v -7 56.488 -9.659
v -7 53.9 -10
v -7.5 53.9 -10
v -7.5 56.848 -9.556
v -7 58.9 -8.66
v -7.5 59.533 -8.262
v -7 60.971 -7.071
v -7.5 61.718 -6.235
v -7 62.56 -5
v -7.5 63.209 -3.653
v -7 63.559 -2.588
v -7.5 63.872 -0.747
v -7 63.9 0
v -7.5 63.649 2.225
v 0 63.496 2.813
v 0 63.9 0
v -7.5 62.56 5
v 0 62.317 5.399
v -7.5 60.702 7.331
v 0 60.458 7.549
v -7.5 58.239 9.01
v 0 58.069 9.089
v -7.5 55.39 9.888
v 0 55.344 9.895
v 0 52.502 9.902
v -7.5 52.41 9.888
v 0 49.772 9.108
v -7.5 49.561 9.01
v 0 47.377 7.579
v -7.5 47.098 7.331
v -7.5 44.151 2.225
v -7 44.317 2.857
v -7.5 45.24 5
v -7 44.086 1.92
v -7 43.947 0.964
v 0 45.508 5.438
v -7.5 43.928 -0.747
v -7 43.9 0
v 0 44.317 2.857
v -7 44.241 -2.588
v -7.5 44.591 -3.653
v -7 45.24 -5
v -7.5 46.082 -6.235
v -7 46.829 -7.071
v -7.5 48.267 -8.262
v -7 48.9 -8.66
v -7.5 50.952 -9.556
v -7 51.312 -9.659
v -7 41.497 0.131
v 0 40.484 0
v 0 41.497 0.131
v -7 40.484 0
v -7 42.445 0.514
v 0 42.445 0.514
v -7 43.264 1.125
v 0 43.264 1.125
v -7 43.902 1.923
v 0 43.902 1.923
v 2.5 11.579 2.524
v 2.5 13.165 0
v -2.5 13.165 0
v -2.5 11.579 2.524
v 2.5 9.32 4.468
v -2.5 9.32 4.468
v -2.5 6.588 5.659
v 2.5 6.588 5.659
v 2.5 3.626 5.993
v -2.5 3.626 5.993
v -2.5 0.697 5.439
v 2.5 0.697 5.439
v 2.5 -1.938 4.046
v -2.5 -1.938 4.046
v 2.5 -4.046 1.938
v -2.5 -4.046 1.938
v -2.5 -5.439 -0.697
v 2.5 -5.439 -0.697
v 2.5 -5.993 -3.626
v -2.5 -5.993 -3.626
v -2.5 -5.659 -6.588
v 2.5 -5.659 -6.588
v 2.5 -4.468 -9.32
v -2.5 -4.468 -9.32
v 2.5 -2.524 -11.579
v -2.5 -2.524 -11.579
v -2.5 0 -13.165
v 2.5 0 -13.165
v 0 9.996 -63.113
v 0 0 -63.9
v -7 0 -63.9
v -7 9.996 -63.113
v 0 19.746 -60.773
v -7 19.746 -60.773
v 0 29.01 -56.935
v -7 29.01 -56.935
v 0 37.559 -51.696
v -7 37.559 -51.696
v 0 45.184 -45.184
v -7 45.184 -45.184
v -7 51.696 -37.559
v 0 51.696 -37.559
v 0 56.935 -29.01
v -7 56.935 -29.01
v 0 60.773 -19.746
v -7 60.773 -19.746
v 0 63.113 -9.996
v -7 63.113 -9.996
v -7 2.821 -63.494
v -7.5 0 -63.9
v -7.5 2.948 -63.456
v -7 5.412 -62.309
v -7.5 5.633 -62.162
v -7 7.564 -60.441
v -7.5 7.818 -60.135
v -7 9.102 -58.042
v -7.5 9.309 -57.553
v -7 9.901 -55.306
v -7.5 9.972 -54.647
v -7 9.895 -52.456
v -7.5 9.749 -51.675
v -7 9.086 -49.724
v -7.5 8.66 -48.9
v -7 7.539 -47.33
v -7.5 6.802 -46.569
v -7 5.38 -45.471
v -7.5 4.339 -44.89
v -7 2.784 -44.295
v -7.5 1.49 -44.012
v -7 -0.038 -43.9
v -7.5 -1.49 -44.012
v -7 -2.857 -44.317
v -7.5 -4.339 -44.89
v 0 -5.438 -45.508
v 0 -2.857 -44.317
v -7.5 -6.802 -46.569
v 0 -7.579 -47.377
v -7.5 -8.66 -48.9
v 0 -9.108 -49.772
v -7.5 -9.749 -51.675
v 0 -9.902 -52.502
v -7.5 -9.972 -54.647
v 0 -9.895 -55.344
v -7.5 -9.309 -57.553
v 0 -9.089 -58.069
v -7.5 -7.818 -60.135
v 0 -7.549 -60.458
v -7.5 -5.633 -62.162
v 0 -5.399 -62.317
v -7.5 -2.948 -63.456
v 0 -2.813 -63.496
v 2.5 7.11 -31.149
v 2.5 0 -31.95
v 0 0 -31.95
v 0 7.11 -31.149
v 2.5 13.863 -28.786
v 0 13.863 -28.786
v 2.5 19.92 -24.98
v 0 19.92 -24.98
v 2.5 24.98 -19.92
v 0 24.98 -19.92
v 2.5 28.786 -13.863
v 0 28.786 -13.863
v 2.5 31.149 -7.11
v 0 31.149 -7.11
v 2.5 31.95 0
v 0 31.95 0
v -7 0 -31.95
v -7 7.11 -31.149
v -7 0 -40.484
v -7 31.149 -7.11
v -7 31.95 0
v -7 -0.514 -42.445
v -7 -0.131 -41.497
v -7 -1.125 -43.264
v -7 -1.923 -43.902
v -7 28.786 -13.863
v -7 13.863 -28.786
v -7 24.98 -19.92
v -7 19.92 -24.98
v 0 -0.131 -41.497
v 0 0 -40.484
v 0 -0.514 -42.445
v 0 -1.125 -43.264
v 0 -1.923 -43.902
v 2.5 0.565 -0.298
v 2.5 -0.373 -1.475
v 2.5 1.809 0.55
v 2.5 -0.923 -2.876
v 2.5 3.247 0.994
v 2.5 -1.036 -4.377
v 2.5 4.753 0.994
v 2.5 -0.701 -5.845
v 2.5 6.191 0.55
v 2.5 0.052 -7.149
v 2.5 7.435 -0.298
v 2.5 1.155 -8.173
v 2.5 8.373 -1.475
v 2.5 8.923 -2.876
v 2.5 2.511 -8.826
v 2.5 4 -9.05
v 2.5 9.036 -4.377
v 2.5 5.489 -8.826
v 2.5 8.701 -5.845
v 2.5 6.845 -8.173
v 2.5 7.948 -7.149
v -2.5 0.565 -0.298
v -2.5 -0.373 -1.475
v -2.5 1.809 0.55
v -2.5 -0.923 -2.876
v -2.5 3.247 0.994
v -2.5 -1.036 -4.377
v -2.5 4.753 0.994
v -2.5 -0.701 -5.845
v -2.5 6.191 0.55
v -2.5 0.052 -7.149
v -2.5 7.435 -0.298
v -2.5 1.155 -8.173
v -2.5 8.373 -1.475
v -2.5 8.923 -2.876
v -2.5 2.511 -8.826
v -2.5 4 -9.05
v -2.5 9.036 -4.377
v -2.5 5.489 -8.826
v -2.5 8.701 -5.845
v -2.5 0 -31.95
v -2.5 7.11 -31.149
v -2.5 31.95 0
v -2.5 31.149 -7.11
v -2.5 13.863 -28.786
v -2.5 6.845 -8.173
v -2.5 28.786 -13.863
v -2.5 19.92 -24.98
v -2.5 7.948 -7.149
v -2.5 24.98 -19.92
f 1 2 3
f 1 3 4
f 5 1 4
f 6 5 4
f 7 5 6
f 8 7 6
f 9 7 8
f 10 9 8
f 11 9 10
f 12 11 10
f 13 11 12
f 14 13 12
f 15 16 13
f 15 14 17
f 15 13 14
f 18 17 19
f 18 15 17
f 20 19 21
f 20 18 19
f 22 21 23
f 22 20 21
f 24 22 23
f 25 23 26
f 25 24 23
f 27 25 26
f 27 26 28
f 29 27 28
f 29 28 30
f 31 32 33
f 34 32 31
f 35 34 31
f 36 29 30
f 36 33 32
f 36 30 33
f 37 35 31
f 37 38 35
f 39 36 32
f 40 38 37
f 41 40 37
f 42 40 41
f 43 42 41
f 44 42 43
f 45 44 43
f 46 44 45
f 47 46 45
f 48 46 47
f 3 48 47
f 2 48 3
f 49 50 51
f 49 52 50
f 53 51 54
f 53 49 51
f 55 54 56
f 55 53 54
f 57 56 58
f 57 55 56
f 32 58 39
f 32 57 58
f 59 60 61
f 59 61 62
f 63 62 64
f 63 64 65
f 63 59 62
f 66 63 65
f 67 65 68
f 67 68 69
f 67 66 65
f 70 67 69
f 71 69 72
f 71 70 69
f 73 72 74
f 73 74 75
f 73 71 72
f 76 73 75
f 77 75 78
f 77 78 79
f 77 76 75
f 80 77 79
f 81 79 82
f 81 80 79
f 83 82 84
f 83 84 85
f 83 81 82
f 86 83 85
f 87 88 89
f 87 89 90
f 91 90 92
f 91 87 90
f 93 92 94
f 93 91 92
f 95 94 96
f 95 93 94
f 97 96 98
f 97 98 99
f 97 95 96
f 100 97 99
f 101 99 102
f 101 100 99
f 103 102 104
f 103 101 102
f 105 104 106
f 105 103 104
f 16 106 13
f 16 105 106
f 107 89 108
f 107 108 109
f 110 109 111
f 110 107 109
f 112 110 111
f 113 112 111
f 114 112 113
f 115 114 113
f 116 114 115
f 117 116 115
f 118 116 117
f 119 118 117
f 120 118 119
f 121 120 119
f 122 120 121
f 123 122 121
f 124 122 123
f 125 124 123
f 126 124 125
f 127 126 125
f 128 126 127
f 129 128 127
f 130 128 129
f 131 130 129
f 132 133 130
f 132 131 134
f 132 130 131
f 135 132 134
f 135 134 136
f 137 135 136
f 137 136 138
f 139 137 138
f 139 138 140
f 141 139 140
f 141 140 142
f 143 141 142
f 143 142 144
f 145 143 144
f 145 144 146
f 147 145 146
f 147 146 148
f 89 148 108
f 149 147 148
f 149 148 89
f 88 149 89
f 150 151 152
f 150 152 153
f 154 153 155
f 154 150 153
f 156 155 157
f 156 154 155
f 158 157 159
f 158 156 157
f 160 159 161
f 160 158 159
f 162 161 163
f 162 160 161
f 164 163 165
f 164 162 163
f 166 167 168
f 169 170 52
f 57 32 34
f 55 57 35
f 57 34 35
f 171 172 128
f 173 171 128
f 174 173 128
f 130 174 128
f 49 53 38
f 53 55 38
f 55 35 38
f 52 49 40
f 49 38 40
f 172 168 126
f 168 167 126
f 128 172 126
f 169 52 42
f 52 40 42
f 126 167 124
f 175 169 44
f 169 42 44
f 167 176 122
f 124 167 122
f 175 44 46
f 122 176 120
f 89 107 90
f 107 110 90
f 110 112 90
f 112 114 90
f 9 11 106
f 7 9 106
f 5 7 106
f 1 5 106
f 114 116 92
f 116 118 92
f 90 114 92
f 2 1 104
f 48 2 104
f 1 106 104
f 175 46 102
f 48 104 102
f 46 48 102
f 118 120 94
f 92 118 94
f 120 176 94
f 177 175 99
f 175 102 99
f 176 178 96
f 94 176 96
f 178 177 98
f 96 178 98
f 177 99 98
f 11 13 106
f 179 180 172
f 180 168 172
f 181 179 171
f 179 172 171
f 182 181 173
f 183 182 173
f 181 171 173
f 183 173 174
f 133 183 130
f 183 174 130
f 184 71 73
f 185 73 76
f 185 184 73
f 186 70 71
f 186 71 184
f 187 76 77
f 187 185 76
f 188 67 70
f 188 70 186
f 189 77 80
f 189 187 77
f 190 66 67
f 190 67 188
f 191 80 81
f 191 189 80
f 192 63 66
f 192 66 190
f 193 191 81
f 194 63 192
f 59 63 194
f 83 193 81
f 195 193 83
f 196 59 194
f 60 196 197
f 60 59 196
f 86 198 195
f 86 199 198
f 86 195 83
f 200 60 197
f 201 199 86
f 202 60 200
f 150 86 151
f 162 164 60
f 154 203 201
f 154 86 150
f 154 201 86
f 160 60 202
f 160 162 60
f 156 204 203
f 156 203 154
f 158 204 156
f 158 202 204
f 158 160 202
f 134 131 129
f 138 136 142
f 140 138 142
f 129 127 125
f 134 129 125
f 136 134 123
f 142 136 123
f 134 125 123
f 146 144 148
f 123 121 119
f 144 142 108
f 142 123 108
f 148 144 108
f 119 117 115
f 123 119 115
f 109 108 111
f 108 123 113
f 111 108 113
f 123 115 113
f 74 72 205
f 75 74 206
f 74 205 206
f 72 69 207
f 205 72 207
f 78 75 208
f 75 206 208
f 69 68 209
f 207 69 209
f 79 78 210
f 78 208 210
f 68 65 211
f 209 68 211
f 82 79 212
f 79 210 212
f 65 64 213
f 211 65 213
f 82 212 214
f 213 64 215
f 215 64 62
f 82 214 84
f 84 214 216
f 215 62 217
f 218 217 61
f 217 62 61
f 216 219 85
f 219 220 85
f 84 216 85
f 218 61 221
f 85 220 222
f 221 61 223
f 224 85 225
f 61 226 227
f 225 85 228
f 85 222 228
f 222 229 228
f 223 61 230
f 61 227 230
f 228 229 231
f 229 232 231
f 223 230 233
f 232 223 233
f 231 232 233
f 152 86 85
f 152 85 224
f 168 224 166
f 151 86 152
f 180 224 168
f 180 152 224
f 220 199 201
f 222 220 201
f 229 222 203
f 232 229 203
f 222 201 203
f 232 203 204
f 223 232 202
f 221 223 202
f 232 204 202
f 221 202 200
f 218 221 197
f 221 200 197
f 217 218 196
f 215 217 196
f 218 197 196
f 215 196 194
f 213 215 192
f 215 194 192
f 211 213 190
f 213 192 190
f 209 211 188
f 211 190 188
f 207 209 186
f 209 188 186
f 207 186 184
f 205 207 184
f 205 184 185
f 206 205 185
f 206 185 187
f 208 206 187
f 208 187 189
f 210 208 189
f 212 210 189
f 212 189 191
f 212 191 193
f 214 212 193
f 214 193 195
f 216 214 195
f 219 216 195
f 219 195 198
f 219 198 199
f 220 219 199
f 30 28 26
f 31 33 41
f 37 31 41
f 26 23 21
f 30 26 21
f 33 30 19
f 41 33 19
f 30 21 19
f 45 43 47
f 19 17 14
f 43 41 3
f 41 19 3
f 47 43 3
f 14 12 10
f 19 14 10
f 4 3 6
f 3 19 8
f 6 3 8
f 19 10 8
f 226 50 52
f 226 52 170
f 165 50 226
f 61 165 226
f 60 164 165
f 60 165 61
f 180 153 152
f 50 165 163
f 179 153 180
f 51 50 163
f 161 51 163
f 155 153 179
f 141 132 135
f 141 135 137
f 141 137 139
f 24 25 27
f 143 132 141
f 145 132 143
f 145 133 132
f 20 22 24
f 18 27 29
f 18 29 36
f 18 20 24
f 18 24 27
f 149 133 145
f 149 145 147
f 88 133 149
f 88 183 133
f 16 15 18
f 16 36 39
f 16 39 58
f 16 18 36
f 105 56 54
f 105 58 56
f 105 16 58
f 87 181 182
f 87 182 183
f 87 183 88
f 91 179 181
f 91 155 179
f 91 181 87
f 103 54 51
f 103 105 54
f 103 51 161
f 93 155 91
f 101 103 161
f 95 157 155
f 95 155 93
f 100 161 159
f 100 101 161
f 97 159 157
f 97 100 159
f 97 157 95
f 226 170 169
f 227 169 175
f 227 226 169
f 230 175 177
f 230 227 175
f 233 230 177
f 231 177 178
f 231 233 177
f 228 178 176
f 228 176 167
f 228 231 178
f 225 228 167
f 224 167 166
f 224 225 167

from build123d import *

# Parameters (mm, degrees)
SALIENTE_EXTRUIR1_DEPTH = 2.5
SALIENTE_EXTRUIR2_DEPTH = 7
CROQUIS2_4_R            = 10
SALIENTE_EXTRUIR3_DEPTH = 7.5
REDONDEO1_R             = 4
REDONDEO2_R             = 4
CROQUIS3_R              = 10
SALIENTE_EXTRUIR4_DEPTH = 5
CROQUIS4_R              = 5.05
CORTAR_EXTRUIR1_DEPTH   = 131


with BuildPart() as part:
    # Croquis2 → Saliente-Extruir1 (new, symmetric)
    with BuildSketch(Plane(origin=(0, 0, 0), x_dir=(0, 0, -1), z_dir=(1, 0, 0))):
        with BuildLine():
            ThreePointArc((31.95, 0), (22.592061659, 22.592061659), (0, 31.95))
            Line((0, 31.95), (0, 0))
            Line((0, 0), (31.95, 0))
        make_face()
    extrude(amount=SALIENTE_EXTRUIR1_DEPTH, both=True)

    # Croquis2<3> → Saliente-Extruir2 (add)
    with BuildSketch(Plane(origin=(0, 0, 0), x_dir=(0, 0, -1), z_dir=(1, 0, 0))):
        with BuildLine():
            ThreePointArc((10, 53.9), (7.071067812, 46.828932188), (0, 43.9))
            Line((0, 43.9), (0, 31.95))
            ThreePointArc((0, 31.95), (22.592061659, 22.592061659), (31.95, 0))
            Line((31.95, 0), (43.9, 0))
            ThreePointArc((43.9, 0), (53.9, 10), (63.9, 0))
            ThreePointArc((63.9, 0), (45.184123318, 45.184123318), (0, 63.9))
            ThreePointArc((0, 63.9), (7.071067812, 60.971067812), (10, 53.9))
        make_face()
    extrude(amount=-SALIENTE_EXTRUIR2_DEPTH)

    # Croquis2<4> → Saliente-Extruir3 (add)
    with BuildSketch(Plane(origin=(0, 0, 0), x_dir=(0, 0, -1), z_dir=(1, 0, 0))):
        with Locations((0, 53.9)):
            Circle(CROQUIS2_4_R)
        with Locations((53.9, 0)):
            Circle(CROQUIS2_4_R)
    extrude(amount=-SALIENTE_EXTRUIR3_DEPTH)

    # Redondeo1
    redondeo1_edges = [part.edges().sort_by_distance(p)[0] for p in [
        (0, 0, 0),
    ]]
    fillet(redondeo1_edges, radius=REDONDEO1_R)

    # Redondeo2
    redondeo2_edges = [part.edges().sort_by_distance(p)[0] for p in [
        (-3.5, 43.9, 0),
        (-3.5, 0, -43.9),
    ]]
    fillet(redondeo2_edges, radius=REDONDEO2_R)

    # Croquis3 → Saliente-Extruir4 (add)
    with BuildSketch(Plane(origin=(2.5, 0, 0), x_dir=(0, 0, -1), z_dir=(1, 0, 0))):
        with Locations((4, 4)):
            Circle(CROQUIS3_R)
    extrude(amount=-SALIENTE_EXTRUIR4_DEPTH)

    # Croquis4 → Cortar-Extruir1 (cut)
    with BuildSketch(Plane(origin=(2.5, 0, 0), x_dir=(0, 0, -1), z_dir=(1, 0, 0))):
        with Locations((4, 4)):
            Circle(CROQUIS4_R)
    extrude(amount=-CORTAR_EXTRUIR1_DEPTH, mode=Mode.SUBTRACT)


solid = part.part
